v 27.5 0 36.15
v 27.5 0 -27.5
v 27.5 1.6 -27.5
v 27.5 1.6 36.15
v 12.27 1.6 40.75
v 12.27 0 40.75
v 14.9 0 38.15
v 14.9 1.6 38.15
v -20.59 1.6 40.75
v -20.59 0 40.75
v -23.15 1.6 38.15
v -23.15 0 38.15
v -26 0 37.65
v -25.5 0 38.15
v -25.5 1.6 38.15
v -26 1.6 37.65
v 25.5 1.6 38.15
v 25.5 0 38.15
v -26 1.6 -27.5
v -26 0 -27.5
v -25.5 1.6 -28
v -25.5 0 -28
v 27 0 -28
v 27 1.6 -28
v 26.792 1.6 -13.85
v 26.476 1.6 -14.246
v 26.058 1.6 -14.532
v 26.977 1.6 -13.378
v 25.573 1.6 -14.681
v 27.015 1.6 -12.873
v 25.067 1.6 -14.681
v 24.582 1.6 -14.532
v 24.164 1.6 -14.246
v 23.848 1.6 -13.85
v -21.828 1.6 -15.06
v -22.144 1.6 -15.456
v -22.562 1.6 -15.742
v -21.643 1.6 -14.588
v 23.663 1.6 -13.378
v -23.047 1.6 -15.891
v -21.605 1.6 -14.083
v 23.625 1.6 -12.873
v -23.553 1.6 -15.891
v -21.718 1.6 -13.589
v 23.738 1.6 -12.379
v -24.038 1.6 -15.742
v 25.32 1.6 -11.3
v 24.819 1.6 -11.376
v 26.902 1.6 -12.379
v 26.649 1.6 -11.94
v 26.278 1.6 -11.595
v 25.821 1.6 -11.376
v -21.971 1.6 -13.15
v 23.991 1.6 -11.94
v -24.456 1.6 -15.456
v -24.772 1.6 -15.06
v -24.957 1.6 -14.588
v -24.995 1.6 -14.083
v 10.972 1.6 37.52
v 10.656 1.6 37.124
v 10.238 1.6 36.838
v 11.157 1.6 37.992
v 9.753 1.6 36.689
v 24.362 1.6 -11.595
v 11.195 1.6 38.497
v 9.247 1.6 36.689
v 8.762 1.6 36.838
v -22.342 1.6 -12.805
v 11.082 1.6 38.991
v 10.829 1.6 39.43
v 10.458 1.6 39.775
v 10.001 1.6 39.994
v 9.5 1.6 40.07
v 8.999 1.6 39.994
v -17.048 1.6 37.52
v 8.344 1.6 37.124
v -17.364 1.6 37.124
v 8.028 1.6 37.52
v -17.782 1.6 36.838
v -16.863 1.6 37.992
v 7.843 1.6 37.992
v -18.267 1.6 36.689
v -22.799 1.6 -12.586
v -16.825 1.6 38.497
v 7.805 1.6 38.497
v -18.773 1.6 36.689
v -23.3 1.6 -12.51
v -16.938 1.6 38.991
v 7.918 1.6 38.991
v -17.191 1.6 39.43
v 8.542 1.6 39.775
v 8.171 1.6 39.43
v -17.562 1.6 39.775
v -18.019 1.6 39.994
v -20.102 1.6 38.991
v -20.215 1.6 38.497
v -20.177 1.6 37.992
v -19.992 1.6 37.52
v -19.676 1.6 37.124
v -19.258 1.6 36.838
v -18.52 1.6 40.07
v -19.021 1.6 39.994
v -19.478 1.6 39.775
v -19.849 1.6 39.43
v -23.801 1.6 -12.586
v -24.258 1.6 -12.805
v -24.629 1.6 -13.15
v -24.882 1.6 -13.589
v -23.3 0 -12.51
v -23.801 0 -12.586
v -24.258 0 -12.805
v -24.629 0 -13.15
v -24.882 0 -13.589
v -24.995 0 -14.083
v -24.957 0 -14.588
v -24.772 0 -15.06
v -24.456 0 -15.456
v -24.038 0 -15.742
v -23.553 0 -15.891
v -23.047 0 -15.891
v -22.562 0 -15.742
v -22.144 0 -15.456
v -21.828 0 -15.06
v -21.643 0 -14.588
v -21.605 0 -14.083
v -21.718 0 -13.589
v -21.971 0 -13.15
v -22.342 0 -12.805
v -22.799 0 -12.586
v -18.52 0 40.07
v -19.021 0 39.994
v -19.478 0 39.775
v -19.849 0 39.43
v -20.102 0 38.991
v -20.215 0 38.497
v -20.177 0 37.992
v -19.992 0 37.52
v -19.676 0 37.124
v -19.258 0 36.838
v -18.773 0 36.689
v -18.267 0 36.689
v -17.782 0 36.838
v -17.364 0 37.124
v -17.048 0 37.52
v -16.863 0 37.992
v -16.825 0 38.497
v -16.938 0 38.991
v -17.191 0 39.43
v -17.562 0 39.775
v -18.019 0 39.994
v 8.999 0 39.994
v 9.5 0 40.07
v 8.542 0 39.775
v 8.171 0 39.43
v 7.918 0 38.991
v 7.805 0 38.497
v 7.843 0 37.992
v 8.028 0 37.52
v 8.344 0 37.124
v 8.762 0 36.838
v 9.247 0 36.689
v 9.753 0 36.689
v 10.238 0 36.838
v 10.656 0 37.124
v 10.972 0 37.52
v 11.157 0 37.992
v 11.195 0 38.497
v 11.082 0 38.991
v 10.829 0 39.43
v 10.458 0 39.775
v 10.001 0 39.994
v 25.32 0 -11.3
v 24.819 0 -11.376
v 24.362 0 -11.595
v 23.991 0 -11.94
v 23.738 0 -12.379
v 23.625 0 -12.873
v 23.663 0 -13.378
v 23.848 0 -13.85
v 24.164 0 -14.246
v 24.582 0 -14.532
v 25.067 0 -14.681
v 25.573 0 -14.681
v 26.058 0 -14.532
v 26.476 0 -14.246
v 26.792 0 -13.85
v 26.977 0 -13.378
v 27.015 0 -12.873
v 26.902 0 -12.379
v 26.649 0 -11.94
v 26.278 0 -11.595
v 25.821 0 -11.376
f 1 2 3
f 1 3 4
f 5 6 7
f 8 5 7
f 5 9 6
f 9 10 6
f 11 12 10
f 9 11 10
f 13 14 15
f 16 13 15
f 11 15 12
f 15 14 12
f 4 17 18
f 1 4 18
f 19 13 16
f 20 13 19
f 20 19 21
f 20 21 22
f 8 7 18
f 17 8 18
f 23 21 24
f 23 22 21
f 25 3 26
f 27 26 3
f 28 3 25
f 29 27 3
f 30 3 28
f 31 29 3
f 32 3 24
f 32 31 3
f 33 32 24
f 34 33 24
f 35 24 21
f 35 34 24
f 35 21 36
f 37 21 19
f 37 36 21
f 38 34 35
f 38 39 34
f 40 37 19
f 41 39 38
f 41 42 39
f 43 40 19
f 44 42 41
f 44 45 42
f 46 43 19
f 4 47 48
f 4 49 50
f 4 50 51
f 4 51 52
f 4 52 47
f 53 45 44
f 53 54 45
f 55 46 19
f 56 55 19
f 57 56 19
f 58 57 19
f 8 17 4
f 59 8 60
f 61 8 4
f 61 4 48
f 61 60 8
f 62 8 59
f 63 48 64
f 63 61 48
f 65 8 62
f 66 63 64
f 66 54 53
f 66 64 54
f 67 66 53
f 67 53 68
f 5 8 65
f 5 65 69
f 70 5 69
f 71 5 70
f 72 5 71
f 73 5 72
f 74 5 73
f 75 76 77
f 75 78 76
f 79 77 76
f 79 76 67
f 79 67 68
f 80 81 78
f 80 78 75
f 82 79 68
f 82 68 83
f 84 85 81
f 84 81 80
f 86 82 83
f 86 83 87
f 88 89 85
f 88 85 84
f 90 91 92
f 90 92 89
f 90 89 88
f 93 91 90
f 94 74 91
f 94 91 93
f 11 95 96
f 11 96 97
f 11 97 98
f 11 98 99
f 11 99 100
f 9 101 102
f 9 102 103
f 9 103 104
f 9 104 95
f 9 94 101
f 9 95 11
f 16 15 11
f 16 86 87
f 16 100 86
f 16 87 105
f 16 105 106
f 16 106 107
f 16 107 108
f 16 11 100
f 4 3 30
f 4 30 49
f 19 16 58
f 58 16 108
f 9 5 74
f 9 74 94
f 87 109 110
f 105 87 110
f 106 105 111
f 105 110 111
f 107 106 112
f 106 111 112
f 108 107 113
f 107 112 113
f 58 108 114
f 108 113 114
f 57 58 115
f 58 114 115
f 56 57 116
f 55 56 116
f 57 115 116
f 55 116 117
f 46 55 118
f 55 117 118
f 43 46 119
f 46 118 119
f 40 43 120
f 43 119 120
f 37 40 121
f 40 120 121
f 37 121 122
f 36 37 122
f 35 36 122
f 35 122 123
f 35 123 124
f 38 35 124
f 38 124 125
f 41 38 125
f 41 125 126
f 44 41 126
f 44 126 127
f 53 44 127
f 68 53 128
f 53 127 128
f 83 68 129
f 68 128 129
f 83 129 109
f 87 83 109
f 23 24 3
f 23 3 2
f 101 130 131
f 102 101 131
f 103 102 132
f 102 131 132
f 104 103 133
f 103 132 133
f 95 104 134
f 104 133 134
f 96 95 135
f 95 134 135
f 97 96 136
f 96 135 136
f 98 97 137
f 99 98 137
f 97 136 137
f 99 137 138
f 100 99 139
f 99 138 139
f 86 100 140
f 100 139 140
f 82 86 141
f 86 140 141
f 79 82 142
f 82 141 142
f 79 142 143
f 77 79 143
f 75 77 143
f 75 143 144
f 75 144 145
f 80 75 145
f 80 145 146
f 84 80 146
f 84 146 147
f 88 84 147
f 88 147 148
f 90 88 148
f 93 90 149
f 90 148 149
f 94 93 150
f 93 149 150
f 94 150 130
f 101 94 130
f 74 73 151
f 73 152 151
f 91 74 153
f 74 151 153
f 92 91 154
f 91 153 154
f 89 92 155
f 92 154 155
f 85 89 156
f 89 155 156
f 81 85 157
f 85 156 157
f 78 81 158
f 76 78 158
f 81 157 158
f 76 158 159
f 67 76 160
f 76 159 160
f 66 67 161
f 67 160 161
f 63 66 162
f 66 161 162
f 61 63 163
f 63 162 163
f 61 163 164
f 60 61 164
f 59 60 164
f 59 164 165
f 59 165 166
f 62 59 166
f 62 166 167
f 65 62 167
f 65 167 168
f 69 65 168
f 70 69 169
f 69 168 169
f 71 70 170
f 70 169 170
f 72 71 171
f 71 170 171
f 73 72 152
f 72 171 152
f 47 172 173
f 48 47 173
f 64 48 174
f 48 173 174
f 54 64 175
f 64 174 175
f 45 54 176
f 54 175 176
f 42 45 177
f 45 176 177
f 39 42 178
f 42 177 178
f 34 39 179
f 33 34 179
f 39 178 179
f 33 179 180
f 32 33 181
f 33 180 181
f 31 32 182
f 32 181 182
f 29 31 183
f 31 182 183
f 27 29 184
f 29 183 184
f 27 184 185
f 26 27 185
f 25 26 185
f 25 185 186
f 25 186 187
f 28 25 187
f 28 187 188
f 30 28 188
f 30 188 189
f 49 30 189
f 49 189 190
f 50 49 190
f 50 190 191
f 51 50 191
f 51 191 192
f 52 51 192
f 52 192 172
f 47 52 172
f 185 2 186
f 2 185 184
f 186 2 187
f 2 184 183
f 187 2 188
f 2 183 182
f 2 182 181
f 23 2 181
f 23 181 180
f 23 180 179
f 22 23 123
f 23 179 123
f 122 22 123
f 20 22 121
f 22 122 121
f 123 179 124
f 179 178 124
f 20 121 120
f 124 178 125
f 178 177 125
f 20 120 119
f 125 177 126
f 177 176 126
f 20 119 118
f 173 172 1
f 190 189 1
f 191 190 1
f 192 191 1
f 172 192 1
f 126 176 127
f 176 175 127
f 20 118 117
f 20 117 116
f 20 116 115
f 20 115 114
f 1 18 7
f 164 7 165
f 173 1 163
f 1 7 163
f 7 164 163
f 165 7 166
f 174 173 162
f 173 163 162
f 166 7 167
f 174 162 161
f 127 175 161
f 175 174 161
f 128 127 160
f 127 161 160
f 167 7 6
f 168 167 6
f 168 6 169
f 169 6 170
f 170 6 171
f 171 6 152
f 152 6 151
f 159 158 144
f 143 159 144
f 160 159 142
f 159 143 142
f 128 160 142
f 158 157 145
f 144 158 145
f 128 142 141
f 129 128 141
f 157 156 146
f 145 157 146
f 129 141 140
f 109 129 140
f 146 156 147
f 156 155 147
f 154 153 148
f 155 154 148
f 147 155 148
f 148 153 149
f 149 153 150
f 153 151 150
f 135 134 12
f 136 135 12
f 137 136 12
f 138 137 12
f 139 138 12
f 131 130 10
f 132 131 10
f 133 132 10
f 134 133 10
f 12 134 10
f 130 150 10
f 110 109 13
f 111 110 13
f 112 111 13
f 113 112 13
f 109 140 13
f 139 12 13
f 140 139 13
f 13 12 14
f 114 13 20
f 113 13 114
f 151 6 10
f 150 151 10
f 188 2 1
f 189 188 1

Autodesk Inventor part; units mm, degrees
ref_plane "YZ Plane" through (0, 0, 0) normal (1, 0, 0) x (0, 1, 0)
ref_plane "XZ Plane" through (0, 0, 0) normal (0, 1, 0) x (-1, 0, 0)
ref_plane "XY Plane" through (0, 0, 0) normal (0, 0, 1) x (1, 0, 0)
sketch "Sketch1" plane through (0, 0, 0) normal (0, 1, 0) x (-1, 0, 0)
  line L0 (26, -28) -> (-27.5, -28)
  line L1 (-27.5, -28) -> (-27.5, 38.15)
  line L2 (26, 38.15) -> (26, -28)
  line L3 (26, 38.15) -> (23.15, 38.15)
  line L4 (23.15, 38.15) -> (20.59, 40.75)
  line L5 (20.59, 40.75) -> (-12.27, 40.75)
  line L6 (-12.27, 40.75) -> (-14.9, 38.15)
  line L7 (-14.9, 38.15) -> (-27.5, 38.15)
  point P0 (0, 0)
  point P1 (-27.5, 40.75)
  point P2 (26, 40.75)
  point P3 (4.16, 40.75)
  point P4 (24.575, 38.15)
  point P5 (-21.2, 38.15)
  dimension "d2" = 53.5
  dimension "d12" = 68.75
  dimension "d13" = 2.6
  dimension "d14" = 2.85
  dimension "d15" = 2.56
  dimension "d16" = 32.86
  dimension "d17" = 12.6
  dimension "d18" = 28
  dimension "d19" = 26
extrude "Extrusion1" add sketch "Sketch1" along normal blind 1.6
chamfer "Chamfer1" distance 2 angle 45 1 edges at (27.5, 0.8, 38.15)
chamfer "Chamfer2" distance 0.5 angle 45 3 edges at (-26, 0.8, 38.15) (-26, 0.8, -28) (27.5, 0.8, -28)
sketch "Sketch2" plane through (0, 1.6, 0) normal (0, 1, 0) x (1, 0, 0)
  line L0 (-26, 27.5) -> (-26, -37.65) projected
  line L1 (27, 28) -> (-25.5, 28) projected
  line L2 (27.5, -36.15) -> (27.5, 27.5) projected
  line L3 (-20.59, -40.75) -> (12.27, -40.75) projected
  point P0 (0, 0)
  point P1 (-23.3, 14.21)
  point P2 (25.32, 13)
  point P3 (9.5, -38.37)
  point P4 (-18.52, -38.37)
  dimension "d28" = 2.7
  dimension "d29" = 13.79
  dimension "d30" = 2.18
  dimension "d31" = 15
  dimension "d32" = 7.48
  dimension "d33" = 2.38
  dimension "d34" = 18
hole "Hole1" at (-23.3, 1.6, -14.21) at (25.32, 1.6, -13) at (9.5, 1.6, 38.37) at (-18.52, 1.6, 38.37) direction (0, -1, 0) diameter 3.4 end through all clearance for "Countersunk Flat Head Screw ISO 2009/7046" size "M3" standard "ISO"
properties part number "ArduinoUnoFootprintPART"
